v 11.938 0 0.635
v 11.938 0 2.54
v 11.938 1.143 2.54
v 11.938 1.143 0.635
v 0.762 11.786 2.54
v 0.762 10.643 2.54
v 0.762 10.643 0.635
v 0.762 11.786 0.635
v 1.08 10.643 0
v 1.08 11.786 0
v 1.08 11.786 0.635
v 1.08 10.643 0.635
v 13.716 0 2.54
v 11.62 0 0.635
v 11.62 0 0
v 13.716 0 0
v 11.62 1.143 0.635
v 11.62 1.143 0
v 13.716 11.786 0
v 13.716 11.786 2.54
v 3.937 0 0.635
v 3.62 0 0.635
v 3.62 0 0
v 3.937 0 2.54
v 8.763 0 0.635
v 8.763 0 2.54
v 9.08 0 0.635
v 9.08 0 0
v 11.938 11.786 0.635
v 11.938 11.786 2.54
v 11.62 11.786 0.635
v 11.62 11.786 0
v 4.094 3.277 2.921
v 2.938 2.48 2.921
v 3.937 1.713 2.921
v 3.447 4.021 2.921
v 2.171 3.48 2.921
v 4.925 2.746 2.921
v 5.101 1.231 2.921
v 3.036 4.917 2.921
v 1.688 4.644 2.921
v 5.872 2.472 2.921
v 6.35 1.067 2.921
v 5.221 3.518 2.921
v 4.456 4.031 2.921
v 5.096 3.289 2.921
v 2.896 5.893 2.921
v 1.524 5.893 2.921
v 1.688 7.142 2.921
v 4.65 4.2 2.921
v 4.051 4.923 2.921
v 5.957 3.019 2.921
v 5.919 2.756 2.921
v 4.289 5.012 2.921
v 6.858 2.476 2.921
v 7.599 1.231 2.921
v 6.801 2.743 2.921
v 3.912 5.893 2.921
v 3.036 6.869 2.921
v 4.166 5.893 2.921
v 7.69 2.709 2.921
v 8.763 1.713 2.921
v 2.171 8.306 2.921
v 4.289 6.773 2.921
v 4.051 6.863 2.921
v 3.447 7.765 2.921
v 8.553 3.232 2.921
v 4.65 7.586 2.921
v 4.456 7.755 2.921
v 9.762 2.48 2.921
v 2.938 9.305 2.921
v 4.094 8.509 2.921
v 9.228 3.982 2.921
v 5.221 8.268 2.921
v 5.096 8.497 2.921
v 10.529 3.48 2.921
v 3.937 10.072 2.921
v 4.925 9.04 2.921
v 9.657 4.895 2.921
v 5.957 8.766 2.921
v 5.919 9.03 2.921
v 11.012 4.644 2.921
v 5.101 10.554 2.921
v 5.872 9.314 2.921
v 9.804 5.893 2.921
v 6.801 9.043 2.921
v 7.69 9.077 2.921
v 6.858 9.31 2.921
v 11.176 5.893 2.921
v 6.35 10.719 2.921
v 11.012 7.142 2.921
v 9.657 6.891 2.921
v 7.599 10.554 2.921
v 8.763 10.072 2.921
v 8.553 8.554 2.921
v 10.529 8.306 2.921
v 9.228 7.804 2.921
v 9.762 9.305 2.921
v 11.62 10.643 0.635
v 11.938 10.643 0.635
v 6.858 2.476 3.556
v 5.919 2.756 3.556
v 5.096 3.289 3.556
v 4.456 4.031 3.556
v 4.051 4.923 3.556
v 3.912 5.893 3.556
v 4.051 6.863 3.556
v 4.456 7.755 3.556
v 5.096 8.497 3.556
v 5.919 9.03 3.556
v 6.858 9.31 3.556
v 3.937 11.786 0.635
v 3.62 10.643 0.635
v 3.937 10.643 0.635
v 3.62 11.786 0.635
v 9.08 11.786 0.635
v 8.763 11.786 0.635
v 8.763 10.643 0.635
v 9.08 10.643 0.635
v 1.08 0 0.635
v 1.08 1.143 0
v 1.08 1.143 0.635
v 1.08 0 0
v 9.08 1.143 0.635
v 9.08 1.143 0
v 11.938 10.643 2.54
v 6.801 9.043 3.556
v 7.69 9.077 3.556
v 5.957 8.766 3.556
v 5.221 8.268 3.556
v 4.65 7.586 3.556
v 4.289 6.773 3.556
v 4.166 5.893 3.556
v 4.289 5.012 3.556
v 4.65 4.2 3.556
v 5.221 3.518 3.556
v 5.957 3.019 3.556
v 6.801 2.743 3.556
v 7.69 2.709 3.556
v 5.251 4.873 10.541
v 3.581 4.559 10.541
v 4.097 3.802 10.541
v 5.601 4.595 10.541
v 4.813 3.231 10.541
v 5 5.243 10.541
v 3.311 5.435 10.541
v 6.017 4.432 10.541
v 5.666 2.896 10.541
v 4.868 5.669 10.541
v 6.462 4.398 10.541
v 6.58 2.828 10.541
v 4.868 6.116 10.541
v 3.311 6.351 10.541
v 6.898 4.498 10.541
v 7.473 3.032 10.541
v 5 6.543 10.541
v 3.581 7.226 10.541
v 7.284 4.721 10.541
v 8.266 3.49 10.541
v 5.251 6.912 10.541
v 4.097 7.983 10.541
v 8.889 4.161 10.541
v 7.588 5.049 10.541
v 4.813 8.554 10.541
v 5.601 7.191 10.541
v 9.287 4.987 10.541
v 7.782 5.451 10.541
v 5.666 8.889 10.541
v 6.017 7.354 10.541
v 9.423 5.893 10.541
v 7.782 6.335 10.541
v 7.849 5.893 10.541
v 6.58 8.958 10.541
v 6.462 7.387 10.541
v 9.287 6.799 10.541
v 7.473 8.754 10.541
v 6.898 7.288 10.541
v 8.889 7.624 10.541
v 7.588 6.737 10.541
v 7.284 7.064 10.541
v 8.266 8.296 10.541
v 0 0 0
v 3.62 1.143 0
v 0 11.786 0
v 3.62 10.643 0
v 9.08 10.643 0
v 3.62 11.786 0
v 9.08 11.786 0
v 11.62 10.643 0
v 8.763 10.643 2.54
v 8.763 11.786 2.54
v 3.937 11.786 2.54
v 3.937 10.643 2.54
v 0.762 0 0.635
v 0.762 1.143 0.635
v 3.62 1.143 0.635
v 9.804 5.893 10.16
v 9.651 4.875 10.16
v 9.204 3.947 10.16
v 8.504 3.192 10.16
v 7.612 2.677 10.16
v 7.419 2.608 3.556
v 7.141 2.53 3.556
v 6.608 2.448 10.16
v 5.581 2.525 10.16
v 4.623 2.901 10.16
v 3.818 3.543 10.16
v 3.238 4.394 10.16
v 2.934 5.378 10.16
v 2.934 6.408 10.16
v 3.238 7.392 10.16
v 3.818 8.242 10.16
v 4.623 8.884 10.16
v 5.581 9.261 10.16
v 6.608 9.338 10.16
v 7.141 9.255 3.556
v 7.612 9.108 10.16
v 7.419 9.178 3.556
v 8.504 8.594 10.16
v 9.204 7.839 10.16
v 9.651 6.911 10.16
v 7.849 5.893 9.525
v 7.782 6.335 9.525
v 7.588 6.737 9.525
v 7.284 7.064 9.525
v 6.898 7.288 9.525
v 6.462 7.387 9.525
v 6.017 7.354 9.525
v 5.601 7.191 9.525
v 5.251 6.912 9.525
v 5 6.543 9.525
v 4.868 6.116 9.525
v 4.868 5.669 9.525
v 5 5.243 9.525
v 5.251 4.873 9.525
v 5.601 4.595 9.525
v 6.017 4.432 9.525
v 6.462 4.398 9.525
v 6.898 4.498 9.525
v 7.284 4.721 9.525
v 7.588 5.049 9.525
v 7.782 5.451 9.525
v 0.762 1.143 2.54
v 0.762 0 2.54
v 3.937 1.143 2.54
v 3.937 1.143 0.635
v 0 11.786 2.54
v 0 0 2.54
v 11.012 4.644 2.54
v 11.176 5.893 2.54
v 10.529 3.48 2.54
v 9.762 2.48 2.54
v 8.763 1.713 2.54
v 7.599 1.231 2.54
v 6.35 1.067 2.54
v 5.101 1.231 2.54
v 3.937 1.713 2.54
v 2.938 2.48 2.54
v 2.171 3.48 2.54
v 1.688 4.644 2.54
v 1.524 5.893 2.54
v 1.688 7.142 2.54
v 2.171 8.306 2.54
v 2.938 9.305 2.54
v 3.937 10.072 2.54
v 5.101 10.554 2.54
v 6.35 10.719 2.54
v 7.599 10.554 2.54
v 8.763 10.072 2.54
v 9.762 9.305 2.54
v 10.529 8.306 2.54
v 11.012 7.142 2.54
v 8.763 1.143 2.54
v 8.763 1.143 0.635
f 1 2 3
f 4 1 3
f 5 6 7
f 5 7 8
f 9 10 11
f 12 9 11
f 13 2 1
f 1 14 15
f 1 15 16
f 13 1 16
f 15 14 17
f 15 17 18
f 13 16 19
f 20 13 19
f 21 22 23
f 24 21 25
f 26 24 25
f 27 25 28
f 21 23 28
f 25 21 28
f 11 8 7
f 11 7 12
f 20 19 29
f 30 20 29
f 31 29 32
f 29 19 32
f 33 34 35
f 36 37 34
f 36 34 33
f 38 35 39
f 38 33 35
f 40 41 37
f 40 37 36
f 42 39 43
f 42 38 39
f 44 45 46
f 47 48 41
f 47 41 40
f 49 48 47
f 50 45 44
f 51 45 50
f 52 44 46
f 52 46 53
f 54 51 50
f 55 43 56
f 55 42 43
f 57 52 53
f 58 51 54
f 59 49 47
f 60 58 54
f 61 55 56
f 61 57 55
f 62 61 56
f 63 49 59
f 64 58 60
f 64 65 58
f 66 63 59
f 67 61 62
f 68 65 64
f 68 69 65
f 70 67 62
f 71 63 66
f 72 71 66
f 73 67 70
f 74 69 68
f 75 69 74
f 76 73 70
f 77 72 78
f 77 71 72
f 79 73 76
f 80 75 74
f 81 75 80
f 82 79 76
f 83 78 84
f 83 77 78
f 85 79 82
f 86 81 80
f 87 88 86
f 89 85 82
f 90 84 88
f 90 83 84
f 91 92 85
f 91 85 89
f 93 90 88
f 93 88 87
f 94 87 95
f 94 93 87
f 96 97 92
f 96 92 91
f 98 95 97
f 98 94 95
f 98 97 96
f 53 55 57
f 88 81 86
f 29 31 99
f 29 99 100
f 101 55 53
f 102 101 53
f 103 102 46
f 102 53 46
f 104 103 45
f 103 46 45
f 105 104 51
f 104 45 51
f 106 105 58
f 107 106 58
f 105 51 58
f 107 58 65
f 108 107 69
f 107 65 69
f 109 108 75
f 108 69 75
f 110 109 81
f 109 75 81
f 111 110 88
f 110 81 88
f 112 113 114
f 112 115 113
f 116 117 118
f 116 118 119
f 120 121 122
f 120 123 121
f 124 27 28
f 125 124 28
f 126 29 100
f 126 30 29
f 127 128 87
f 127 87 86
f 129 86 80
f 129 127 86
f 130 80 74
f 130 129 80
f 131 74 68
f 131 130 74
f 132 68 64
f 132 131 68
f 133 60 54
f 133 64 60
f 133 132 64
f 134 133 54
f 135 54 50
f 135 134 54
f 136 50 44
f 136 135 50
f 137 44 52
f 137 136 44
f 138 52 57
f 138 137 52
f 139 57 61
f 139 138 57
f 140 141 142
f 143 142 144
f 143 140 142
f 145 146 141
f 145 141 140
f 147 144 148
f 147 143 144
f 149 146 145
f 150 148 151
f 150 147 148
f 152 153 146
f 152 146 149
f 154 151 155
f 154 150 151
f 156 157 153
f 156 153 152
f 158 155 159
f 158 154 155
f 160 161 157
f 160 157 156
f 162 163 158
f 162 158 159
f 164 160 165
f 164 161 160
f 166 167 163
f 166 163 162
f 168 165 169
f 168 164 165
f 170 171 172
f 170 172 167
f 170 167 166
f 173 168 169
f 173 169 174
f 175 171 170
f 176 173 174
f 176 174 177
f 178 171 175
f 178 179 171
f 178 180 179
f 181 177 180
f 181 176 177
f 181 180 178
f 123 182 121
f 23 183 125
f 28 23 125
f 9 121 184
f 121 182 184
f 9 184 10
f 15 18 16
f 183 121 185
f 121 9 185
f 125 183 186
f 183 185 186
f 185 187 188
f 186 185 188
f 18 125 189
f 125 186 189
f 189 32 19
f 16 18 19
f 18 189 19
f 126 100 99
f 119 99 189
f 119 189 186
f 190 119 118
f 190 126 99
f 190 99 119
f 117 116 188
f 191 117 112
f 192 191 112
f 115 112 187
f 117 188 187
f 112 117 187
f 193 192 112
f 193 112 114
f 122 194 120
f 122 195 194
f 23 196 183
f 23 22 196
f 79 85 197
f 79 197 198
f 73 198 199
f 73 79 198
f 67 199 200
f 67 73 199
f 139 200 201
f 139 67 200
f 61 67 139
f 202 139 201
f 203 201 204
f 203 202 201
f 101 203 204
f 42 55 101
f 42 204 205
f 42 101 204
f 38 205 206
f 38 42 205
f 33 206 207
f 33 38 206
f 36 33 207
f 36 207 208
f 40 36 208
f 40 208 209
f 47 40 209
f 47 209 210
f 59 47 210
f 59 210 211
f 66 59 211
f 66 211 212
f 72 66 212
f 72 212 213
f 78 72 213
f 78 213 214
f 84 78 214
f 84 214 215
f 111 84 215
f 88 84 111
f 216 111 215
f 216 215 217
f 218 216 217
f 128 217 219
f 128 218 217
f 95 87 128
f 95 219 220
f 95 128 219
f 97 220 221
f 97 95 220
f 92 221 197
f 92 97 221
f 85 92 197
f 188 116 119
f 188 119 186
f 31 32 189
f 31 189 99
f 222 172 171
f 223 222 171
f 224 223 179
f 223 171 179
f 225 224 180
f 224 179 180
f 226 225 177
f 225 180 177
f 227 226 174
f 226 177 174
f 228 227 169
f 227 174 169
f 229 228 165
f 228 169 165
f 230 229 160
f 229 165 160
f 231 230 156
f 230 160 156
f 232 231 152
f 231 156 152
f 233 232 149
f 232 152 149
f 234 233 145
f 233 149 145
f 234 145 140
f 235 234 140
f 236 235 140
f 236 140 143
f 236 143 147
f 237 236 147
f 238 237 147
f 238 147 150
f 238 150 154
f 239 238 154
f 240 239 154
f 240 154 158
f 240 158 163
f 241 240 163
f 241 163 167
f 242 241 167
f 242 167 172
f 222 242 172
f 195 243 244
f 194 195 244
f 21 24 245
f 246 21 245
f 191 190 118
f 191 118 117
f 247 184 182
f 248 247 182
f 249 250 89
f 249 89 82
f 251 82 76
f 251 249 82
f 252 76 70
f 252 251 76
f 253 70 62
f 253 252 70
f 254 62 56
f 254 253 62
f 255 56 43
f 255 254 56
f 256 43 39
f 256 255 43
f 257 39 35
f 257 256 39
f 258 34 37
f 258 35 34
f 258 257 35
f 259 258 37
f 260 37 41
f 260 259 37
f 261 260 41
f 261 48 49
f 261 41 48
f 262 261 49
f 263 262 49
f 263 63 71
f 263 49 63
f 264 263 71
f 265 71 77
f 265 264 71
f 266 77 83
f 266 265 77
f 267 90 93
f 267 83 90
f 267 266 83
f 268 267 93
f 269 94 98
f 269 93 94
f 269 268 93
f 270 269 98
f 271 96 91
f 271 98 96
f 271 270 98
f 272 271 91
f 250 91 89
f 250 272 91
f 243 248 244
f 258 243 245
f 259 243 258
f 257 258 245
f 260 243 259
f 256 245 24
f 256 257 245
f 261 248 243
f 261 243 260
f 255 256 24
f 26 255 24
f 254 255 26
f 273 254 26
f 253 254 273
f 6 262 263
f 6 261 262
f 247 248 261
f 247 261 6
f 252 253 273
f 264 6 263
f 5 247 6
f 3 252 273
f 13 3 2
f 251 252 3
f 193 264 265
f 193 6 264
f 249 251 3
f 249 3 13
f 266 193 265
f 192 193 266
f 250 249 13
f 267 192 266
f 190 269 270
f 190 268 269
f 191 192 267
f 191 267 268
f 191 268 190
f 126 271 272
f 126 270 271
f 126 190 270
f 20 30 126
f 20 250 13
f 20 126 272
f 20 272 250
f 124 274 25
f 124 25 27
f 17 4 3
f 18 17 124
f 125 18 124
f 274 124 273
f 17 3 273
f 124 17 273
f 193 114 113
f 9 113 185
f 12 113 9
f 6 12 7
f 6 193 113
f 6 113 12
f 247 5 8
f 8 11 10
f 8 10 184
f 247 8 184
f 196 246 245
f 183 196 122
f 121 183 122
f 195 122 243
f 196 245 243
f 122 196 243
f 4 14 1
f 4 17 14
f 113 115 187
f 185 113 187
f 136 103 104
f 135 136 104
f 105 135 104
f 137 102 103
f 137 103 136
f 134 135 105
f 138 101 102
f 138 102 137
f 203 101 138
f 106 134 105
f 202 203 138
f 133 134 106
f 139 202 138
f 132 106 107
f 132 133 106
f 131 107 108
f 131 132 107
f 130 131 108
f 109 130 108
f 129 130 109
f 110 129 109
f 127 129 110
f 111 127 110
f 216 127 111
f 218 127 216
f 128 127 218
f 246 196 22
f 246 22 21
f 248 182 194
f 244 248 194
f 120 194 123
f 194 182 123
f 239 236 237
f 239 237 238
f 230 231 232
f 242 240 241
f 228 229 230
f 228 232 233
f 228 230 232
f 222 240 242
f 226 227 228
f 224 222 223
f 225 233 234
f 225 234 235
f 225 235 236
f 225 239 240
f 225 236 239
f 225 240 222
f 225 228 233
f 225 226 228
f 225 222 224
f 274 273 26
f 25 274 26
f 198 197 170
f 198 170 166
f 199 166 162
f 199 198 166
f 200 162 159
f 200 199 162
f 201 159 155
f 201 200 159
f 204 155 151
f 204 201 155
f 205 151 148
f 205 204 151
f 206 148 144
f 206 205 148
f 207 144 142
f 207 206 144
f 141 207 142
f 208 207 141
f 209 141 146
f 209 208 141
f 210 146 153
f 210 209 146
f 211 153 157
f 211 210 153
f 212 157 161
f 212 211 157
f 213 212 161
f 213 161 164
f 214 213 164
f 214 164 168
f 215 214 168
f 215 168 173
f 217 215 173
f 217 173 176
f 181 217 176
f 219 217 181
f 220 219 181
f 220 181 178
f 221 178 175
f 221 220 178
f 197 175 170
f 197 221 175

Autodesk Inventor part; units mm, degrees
ref_plane "XZ Plane" through (0, 0, 0) normal (0, 1, 0) x (-1, 0, 0)
ref_plane "XY Plane" through (0, 0, 0) normal (0, 0, 1) x (1, 0, 0)
sketch "Sketch1" plane through (0, 0, 0) normal (0, 0, 1) x (1, 0, 0)
  line L0 (0, 0) -> (13.716, 0)
  line L1 (13.716, 0) -> (13.716, 11.7856)
  line L2 (13.716, 11.7856) -> (0, 11.7856)
  line L3 (0, 11.7856) -> (0, 0)
  dimension "d0" = 13.716
  dimension "d1" = 11.7856
extrude "Extrusion1" add sketch "Sketch1" along normal blind 2.54
sketch "Sketch2" plane through (0, 0, 2.54) normal (0, 0, 1) x (1, 0, 0)
  line L0 (13.716, 0) -> (13.716, 11.7856) projected
  line L1 (13.716, 11.7856) -> (0, 11.7856) projected
  circle A0 centre (6.35, 5.8928) radius 3.4544
  dimension "d4" = 6.9088
  dimension "d5" = 7.366
  dimension "d6" = 11.7856
  dimension "d7" = 5.8928
extrude "Extrusion2" add sketch "Sketch2" along normal blind 8.001
thread "Thread1" size "M7x1" class "6g" standard "ISO Metric profile" full length
sketch "Sketch3" plane through (0, 0, 2.54) normal (0, 0, 1) x (1, 0, 0)
  circle A0 centre (6.35, 5.8928) radius 3.4544 projected
  circle A1 centre (6.35, 5.8928) radius 4.826
  dimension "d12" = 9.652
extrude "Extrusion3" add sketch "Sketch3" along normal blind 0.381
chamfer "Chamfer1" distance 0.381 angle 45 1 edges at (2.8956, 5.8928, 10.541)
ref_plane "Work Plane1" through (7.366, 0, 0) normal (1, 0, 0) x (0, 1, 0)
sketch "Sketch4" plane through (7.366, 0, 0) normal (1, 0, 0) x (0, 1, 0)
  line L0 (11.7856, 0) -> (0, 0) projected
  line L1 (9.3472, 2.921) -> (2.4384, 2.921) projected
  line L2 (5.8928, 2.921) -> (5.8928, -2.4744)
  line L3 (9.3472, 2.921) -> (9.0932, 2.921)
  line L4 (9.0932, 2.921) -> (9.0932, 3.556)
  line L5 (9.0932, 3.556) -> (9.3472, 3.556)
  line L6 (9.3472, 3.556) -> (9.3472, 2.921)
  dimension "d19" = 0.254
  dimension "d20" = 0.635
revolve "Revolution1" cut sketch "Sketch4" angle 360 about axis through (7.366, 5.8928, 2.921) along (0, 0, -1)
sketch "Sketch5" plane through (6.35, 5.8928, 10.541) normal (0, 0, 1) x (1, 0, 0)
  circle A0 centre (0, 0) radius 4.826 projected
  circle A1 centre (0, 0) radius 1.4986
  point P0 (-6.35, -5.8928)
  dimension "d22" = 2.9972
extrude "Extrusion4" cut sketch "Sketch5" against normal blind 1.016 contours A1
sketch "Sketch6" plane through (0, 0, 2.54) normal (0, 0, 1) x (1, 0, 0)
  line L0 (0, 0) -> (13.716, 0) projected
  line L1 (13.716, 11.7856) -> (0, 11.7856) projected
  line L2 (8.763, 0) -> (11.938, 0)
  line L3 (11.938, 0) -> (11.938, 1.143)
  line L4 (11.938, 1.143) -> (8.763, 1.143)
  line L5 (8.763, 1.143) -> (8.763, 0)
  line L6 (0.762, 0) -> (3.937, 0)
  line L7 (3.937, 0) -> (3.937, 1.143)
  line L8 (3.937, 1.143) -> (0.762, 1.143)
  line L9 (0.762, 1.143) -> (0.762, 0)
  line L10 (0.762, 11.7856) -> (3.937, 11.7856)
  line L11 (3.937, 11.7856) -> (3.937, 10.6426)
  line L12 (3.937, 10.6426) -> (0.762, 10.6426)
  line L13 (0.762, 10.6426) -> (0.762, 11.7856)
  line L14 (8.763, 11.7856) -> (11.938, 11.7856)
  line L15 (11.938, 11.7856) -> (11.938, 10.6426)
  line L16 (11.938, 10.6426) -> (8.763, 10.6426)
  line L17 (8.763, 10.6426) -> (8.763, 11.7856)
  circle A0 centre (6.35, 5.8928) radius 4.826 projected
  arc A1 (6.8134, 3.2019) -> (3.704, 6.5668) centre (6.35, 5.8928) ccw projected
  circle A2 centre (6.35, 5.8928) radius 1.4859 projected
  point P0 (11.938, 0.5715)
  point P1 (11.938, 11.2141)
  point P2 (0.762, 0.5715)
  point P3 (0.762, 11.2141)
  point P4 (2.3495, 10.6426)
  point P5 (10.3505, 10.6426)
  point P6 (2.3495, 1.143)
  point P7 (10.3505, 1.143)
  dimension "d25" = 3.175
  dimension "d26" = 3.175
  dimension "d27" = 3.175
  dimension "d28" = 3.175
  dimension "d29" = 13.716
  dimension "d30" = 11.176
  dimension "d32" = 1.143
  dimension "d33" = 1.143
  dimension "d34" = 4.826
  dimension "d35" = 0.762
extrude "Extrusion5" cut sketch "Sketch6" against normal blind 1.905 contours L9 L8 L7 L0 | L5 L4 L3 L0 | L15 L16 L17 L1 | L11 L12 L13 L1
sketch "Sketch7" plane through (0, 0, 0) normal (0, -1, 0) x (1, 0, 0)
  line L0 (3.937, 2.54) -> (3.937, 0.635) projected
  line L1 (3.937, 0.635) -> (0.762, 0.635) projected
  line L2 (0.762, 0.635) -> (0.762, 2.54) projected
  line L3 (0, 2.54) -> (0.762, 2.54) projected
  line L4 (0, 0) -> (0, 2.54) projected
  line L5 (0, 0) -> (13.716, 0) projected
  line L6 (11.938, 0.635) -> (8.763, 0.635) projected
  line L7 (8.763, 0.635) -> (8.763, 2.54) projected
  line L8 (3.937, 2.54) -> (8.763, 2.54) projected
  line L9 (11.6205, 0.635) -> (11.6205, 0)
  line L10 (8.763, 0.635) -> (11.938, 0.635) projected
  line L11 (9.0805, 0.635) -> (9.0805, 0)
  line L12 (13.716, 0) -> (0, 0) projected
  dimension "d38" = 3.175
  dimension "d39" = 2.54
  dimension "d40" = 0.3175
extrude "Extrusion6" cut sketch "Sketch7" against normal up to surface (1.143 mm away) contours L6 L9 L5 L11
sketch "Sketch8" plane through (0, 0, 0) normal (0, -1, 0) x (1, 0, 0)
  line L0 (3.937, 0.635) -> (0.762, 0.635) projected
  line L1 (0, 0) -> (9.0805, 0) projected
  line L2 (1.0795, 0.635) -> (3.6195, 0.635)
  line L3 (3.6195, 0.635) -> (3.6195, 0)
  line L4 (3.6195, 0) -> (1.0795, 0)
  line L5 (1.0795, 0) -> (1.0795, 0.635)
  dimension "d43" = 2.54
  dimension "d44" = 3.175
  dimension "d45" = 0.3175
extrude "Extrusion7" cut sketch "Sketch8" against normal up to surface (1.143 mm away)
sketch "Sketch9" plane through (0, 11.7856, 0) normal (0, 1, 0) x (1, 0, 0)
  line L0 (11.938, -0.635) -> (11.938, -2.54) projected
  line L1 (13.716, 0) -> (0, 0) projected
  line L2 (0.762, -0.635) -> (3.937, -0.635) projected
  line L3 (8.763, -2.54) -> (3.937, -2.54) projected
  line L4 (1.0795, -0.635) -> (3.6195, -0.635)
  line L5 (3.6195, -0.635) -> (3.6195, 0)
  line L6 (3.6195, 0) -> (1.0795, 0)
  line L7 (1.0795, 0) -> (1.0795, -0.635)
  line L8 (6.35, -2.54) -> (6.35, 1.5973)
  line L9 (11.6205, -0.635) -> (9.0805, -0.635)
  line L10 (9.0805, -0.635) -> (9.0805, 0)
  line L11 (9.0805, 0) -> (11.6205, 0)
  line L12 (11.6205, 0) -> (11.6205, -0.635)
  point P0 (12.7, 0)
  point P1 (11.938, -0.635)
  dimension "d48" = 2.54
  dimension "d49" = 3.175
  dimension "d50" = 0.3175
  dimension "d51" = 0.3175
extrude "Extrusion8" cut sketch "Sketch9" against normal up to surface (1.143 mm away)
equation "\"d7\" = 0.5 * d6"
equation "\"d40\" = -0.5 * d39 + 0.5 * d38"
equation "\"d45\" = -0.5 * d43 + 0.5 * d44"
equation "\"d50\" = -0.5 * d48 + 0.5 * d49"
properties part number "mtg flange"
